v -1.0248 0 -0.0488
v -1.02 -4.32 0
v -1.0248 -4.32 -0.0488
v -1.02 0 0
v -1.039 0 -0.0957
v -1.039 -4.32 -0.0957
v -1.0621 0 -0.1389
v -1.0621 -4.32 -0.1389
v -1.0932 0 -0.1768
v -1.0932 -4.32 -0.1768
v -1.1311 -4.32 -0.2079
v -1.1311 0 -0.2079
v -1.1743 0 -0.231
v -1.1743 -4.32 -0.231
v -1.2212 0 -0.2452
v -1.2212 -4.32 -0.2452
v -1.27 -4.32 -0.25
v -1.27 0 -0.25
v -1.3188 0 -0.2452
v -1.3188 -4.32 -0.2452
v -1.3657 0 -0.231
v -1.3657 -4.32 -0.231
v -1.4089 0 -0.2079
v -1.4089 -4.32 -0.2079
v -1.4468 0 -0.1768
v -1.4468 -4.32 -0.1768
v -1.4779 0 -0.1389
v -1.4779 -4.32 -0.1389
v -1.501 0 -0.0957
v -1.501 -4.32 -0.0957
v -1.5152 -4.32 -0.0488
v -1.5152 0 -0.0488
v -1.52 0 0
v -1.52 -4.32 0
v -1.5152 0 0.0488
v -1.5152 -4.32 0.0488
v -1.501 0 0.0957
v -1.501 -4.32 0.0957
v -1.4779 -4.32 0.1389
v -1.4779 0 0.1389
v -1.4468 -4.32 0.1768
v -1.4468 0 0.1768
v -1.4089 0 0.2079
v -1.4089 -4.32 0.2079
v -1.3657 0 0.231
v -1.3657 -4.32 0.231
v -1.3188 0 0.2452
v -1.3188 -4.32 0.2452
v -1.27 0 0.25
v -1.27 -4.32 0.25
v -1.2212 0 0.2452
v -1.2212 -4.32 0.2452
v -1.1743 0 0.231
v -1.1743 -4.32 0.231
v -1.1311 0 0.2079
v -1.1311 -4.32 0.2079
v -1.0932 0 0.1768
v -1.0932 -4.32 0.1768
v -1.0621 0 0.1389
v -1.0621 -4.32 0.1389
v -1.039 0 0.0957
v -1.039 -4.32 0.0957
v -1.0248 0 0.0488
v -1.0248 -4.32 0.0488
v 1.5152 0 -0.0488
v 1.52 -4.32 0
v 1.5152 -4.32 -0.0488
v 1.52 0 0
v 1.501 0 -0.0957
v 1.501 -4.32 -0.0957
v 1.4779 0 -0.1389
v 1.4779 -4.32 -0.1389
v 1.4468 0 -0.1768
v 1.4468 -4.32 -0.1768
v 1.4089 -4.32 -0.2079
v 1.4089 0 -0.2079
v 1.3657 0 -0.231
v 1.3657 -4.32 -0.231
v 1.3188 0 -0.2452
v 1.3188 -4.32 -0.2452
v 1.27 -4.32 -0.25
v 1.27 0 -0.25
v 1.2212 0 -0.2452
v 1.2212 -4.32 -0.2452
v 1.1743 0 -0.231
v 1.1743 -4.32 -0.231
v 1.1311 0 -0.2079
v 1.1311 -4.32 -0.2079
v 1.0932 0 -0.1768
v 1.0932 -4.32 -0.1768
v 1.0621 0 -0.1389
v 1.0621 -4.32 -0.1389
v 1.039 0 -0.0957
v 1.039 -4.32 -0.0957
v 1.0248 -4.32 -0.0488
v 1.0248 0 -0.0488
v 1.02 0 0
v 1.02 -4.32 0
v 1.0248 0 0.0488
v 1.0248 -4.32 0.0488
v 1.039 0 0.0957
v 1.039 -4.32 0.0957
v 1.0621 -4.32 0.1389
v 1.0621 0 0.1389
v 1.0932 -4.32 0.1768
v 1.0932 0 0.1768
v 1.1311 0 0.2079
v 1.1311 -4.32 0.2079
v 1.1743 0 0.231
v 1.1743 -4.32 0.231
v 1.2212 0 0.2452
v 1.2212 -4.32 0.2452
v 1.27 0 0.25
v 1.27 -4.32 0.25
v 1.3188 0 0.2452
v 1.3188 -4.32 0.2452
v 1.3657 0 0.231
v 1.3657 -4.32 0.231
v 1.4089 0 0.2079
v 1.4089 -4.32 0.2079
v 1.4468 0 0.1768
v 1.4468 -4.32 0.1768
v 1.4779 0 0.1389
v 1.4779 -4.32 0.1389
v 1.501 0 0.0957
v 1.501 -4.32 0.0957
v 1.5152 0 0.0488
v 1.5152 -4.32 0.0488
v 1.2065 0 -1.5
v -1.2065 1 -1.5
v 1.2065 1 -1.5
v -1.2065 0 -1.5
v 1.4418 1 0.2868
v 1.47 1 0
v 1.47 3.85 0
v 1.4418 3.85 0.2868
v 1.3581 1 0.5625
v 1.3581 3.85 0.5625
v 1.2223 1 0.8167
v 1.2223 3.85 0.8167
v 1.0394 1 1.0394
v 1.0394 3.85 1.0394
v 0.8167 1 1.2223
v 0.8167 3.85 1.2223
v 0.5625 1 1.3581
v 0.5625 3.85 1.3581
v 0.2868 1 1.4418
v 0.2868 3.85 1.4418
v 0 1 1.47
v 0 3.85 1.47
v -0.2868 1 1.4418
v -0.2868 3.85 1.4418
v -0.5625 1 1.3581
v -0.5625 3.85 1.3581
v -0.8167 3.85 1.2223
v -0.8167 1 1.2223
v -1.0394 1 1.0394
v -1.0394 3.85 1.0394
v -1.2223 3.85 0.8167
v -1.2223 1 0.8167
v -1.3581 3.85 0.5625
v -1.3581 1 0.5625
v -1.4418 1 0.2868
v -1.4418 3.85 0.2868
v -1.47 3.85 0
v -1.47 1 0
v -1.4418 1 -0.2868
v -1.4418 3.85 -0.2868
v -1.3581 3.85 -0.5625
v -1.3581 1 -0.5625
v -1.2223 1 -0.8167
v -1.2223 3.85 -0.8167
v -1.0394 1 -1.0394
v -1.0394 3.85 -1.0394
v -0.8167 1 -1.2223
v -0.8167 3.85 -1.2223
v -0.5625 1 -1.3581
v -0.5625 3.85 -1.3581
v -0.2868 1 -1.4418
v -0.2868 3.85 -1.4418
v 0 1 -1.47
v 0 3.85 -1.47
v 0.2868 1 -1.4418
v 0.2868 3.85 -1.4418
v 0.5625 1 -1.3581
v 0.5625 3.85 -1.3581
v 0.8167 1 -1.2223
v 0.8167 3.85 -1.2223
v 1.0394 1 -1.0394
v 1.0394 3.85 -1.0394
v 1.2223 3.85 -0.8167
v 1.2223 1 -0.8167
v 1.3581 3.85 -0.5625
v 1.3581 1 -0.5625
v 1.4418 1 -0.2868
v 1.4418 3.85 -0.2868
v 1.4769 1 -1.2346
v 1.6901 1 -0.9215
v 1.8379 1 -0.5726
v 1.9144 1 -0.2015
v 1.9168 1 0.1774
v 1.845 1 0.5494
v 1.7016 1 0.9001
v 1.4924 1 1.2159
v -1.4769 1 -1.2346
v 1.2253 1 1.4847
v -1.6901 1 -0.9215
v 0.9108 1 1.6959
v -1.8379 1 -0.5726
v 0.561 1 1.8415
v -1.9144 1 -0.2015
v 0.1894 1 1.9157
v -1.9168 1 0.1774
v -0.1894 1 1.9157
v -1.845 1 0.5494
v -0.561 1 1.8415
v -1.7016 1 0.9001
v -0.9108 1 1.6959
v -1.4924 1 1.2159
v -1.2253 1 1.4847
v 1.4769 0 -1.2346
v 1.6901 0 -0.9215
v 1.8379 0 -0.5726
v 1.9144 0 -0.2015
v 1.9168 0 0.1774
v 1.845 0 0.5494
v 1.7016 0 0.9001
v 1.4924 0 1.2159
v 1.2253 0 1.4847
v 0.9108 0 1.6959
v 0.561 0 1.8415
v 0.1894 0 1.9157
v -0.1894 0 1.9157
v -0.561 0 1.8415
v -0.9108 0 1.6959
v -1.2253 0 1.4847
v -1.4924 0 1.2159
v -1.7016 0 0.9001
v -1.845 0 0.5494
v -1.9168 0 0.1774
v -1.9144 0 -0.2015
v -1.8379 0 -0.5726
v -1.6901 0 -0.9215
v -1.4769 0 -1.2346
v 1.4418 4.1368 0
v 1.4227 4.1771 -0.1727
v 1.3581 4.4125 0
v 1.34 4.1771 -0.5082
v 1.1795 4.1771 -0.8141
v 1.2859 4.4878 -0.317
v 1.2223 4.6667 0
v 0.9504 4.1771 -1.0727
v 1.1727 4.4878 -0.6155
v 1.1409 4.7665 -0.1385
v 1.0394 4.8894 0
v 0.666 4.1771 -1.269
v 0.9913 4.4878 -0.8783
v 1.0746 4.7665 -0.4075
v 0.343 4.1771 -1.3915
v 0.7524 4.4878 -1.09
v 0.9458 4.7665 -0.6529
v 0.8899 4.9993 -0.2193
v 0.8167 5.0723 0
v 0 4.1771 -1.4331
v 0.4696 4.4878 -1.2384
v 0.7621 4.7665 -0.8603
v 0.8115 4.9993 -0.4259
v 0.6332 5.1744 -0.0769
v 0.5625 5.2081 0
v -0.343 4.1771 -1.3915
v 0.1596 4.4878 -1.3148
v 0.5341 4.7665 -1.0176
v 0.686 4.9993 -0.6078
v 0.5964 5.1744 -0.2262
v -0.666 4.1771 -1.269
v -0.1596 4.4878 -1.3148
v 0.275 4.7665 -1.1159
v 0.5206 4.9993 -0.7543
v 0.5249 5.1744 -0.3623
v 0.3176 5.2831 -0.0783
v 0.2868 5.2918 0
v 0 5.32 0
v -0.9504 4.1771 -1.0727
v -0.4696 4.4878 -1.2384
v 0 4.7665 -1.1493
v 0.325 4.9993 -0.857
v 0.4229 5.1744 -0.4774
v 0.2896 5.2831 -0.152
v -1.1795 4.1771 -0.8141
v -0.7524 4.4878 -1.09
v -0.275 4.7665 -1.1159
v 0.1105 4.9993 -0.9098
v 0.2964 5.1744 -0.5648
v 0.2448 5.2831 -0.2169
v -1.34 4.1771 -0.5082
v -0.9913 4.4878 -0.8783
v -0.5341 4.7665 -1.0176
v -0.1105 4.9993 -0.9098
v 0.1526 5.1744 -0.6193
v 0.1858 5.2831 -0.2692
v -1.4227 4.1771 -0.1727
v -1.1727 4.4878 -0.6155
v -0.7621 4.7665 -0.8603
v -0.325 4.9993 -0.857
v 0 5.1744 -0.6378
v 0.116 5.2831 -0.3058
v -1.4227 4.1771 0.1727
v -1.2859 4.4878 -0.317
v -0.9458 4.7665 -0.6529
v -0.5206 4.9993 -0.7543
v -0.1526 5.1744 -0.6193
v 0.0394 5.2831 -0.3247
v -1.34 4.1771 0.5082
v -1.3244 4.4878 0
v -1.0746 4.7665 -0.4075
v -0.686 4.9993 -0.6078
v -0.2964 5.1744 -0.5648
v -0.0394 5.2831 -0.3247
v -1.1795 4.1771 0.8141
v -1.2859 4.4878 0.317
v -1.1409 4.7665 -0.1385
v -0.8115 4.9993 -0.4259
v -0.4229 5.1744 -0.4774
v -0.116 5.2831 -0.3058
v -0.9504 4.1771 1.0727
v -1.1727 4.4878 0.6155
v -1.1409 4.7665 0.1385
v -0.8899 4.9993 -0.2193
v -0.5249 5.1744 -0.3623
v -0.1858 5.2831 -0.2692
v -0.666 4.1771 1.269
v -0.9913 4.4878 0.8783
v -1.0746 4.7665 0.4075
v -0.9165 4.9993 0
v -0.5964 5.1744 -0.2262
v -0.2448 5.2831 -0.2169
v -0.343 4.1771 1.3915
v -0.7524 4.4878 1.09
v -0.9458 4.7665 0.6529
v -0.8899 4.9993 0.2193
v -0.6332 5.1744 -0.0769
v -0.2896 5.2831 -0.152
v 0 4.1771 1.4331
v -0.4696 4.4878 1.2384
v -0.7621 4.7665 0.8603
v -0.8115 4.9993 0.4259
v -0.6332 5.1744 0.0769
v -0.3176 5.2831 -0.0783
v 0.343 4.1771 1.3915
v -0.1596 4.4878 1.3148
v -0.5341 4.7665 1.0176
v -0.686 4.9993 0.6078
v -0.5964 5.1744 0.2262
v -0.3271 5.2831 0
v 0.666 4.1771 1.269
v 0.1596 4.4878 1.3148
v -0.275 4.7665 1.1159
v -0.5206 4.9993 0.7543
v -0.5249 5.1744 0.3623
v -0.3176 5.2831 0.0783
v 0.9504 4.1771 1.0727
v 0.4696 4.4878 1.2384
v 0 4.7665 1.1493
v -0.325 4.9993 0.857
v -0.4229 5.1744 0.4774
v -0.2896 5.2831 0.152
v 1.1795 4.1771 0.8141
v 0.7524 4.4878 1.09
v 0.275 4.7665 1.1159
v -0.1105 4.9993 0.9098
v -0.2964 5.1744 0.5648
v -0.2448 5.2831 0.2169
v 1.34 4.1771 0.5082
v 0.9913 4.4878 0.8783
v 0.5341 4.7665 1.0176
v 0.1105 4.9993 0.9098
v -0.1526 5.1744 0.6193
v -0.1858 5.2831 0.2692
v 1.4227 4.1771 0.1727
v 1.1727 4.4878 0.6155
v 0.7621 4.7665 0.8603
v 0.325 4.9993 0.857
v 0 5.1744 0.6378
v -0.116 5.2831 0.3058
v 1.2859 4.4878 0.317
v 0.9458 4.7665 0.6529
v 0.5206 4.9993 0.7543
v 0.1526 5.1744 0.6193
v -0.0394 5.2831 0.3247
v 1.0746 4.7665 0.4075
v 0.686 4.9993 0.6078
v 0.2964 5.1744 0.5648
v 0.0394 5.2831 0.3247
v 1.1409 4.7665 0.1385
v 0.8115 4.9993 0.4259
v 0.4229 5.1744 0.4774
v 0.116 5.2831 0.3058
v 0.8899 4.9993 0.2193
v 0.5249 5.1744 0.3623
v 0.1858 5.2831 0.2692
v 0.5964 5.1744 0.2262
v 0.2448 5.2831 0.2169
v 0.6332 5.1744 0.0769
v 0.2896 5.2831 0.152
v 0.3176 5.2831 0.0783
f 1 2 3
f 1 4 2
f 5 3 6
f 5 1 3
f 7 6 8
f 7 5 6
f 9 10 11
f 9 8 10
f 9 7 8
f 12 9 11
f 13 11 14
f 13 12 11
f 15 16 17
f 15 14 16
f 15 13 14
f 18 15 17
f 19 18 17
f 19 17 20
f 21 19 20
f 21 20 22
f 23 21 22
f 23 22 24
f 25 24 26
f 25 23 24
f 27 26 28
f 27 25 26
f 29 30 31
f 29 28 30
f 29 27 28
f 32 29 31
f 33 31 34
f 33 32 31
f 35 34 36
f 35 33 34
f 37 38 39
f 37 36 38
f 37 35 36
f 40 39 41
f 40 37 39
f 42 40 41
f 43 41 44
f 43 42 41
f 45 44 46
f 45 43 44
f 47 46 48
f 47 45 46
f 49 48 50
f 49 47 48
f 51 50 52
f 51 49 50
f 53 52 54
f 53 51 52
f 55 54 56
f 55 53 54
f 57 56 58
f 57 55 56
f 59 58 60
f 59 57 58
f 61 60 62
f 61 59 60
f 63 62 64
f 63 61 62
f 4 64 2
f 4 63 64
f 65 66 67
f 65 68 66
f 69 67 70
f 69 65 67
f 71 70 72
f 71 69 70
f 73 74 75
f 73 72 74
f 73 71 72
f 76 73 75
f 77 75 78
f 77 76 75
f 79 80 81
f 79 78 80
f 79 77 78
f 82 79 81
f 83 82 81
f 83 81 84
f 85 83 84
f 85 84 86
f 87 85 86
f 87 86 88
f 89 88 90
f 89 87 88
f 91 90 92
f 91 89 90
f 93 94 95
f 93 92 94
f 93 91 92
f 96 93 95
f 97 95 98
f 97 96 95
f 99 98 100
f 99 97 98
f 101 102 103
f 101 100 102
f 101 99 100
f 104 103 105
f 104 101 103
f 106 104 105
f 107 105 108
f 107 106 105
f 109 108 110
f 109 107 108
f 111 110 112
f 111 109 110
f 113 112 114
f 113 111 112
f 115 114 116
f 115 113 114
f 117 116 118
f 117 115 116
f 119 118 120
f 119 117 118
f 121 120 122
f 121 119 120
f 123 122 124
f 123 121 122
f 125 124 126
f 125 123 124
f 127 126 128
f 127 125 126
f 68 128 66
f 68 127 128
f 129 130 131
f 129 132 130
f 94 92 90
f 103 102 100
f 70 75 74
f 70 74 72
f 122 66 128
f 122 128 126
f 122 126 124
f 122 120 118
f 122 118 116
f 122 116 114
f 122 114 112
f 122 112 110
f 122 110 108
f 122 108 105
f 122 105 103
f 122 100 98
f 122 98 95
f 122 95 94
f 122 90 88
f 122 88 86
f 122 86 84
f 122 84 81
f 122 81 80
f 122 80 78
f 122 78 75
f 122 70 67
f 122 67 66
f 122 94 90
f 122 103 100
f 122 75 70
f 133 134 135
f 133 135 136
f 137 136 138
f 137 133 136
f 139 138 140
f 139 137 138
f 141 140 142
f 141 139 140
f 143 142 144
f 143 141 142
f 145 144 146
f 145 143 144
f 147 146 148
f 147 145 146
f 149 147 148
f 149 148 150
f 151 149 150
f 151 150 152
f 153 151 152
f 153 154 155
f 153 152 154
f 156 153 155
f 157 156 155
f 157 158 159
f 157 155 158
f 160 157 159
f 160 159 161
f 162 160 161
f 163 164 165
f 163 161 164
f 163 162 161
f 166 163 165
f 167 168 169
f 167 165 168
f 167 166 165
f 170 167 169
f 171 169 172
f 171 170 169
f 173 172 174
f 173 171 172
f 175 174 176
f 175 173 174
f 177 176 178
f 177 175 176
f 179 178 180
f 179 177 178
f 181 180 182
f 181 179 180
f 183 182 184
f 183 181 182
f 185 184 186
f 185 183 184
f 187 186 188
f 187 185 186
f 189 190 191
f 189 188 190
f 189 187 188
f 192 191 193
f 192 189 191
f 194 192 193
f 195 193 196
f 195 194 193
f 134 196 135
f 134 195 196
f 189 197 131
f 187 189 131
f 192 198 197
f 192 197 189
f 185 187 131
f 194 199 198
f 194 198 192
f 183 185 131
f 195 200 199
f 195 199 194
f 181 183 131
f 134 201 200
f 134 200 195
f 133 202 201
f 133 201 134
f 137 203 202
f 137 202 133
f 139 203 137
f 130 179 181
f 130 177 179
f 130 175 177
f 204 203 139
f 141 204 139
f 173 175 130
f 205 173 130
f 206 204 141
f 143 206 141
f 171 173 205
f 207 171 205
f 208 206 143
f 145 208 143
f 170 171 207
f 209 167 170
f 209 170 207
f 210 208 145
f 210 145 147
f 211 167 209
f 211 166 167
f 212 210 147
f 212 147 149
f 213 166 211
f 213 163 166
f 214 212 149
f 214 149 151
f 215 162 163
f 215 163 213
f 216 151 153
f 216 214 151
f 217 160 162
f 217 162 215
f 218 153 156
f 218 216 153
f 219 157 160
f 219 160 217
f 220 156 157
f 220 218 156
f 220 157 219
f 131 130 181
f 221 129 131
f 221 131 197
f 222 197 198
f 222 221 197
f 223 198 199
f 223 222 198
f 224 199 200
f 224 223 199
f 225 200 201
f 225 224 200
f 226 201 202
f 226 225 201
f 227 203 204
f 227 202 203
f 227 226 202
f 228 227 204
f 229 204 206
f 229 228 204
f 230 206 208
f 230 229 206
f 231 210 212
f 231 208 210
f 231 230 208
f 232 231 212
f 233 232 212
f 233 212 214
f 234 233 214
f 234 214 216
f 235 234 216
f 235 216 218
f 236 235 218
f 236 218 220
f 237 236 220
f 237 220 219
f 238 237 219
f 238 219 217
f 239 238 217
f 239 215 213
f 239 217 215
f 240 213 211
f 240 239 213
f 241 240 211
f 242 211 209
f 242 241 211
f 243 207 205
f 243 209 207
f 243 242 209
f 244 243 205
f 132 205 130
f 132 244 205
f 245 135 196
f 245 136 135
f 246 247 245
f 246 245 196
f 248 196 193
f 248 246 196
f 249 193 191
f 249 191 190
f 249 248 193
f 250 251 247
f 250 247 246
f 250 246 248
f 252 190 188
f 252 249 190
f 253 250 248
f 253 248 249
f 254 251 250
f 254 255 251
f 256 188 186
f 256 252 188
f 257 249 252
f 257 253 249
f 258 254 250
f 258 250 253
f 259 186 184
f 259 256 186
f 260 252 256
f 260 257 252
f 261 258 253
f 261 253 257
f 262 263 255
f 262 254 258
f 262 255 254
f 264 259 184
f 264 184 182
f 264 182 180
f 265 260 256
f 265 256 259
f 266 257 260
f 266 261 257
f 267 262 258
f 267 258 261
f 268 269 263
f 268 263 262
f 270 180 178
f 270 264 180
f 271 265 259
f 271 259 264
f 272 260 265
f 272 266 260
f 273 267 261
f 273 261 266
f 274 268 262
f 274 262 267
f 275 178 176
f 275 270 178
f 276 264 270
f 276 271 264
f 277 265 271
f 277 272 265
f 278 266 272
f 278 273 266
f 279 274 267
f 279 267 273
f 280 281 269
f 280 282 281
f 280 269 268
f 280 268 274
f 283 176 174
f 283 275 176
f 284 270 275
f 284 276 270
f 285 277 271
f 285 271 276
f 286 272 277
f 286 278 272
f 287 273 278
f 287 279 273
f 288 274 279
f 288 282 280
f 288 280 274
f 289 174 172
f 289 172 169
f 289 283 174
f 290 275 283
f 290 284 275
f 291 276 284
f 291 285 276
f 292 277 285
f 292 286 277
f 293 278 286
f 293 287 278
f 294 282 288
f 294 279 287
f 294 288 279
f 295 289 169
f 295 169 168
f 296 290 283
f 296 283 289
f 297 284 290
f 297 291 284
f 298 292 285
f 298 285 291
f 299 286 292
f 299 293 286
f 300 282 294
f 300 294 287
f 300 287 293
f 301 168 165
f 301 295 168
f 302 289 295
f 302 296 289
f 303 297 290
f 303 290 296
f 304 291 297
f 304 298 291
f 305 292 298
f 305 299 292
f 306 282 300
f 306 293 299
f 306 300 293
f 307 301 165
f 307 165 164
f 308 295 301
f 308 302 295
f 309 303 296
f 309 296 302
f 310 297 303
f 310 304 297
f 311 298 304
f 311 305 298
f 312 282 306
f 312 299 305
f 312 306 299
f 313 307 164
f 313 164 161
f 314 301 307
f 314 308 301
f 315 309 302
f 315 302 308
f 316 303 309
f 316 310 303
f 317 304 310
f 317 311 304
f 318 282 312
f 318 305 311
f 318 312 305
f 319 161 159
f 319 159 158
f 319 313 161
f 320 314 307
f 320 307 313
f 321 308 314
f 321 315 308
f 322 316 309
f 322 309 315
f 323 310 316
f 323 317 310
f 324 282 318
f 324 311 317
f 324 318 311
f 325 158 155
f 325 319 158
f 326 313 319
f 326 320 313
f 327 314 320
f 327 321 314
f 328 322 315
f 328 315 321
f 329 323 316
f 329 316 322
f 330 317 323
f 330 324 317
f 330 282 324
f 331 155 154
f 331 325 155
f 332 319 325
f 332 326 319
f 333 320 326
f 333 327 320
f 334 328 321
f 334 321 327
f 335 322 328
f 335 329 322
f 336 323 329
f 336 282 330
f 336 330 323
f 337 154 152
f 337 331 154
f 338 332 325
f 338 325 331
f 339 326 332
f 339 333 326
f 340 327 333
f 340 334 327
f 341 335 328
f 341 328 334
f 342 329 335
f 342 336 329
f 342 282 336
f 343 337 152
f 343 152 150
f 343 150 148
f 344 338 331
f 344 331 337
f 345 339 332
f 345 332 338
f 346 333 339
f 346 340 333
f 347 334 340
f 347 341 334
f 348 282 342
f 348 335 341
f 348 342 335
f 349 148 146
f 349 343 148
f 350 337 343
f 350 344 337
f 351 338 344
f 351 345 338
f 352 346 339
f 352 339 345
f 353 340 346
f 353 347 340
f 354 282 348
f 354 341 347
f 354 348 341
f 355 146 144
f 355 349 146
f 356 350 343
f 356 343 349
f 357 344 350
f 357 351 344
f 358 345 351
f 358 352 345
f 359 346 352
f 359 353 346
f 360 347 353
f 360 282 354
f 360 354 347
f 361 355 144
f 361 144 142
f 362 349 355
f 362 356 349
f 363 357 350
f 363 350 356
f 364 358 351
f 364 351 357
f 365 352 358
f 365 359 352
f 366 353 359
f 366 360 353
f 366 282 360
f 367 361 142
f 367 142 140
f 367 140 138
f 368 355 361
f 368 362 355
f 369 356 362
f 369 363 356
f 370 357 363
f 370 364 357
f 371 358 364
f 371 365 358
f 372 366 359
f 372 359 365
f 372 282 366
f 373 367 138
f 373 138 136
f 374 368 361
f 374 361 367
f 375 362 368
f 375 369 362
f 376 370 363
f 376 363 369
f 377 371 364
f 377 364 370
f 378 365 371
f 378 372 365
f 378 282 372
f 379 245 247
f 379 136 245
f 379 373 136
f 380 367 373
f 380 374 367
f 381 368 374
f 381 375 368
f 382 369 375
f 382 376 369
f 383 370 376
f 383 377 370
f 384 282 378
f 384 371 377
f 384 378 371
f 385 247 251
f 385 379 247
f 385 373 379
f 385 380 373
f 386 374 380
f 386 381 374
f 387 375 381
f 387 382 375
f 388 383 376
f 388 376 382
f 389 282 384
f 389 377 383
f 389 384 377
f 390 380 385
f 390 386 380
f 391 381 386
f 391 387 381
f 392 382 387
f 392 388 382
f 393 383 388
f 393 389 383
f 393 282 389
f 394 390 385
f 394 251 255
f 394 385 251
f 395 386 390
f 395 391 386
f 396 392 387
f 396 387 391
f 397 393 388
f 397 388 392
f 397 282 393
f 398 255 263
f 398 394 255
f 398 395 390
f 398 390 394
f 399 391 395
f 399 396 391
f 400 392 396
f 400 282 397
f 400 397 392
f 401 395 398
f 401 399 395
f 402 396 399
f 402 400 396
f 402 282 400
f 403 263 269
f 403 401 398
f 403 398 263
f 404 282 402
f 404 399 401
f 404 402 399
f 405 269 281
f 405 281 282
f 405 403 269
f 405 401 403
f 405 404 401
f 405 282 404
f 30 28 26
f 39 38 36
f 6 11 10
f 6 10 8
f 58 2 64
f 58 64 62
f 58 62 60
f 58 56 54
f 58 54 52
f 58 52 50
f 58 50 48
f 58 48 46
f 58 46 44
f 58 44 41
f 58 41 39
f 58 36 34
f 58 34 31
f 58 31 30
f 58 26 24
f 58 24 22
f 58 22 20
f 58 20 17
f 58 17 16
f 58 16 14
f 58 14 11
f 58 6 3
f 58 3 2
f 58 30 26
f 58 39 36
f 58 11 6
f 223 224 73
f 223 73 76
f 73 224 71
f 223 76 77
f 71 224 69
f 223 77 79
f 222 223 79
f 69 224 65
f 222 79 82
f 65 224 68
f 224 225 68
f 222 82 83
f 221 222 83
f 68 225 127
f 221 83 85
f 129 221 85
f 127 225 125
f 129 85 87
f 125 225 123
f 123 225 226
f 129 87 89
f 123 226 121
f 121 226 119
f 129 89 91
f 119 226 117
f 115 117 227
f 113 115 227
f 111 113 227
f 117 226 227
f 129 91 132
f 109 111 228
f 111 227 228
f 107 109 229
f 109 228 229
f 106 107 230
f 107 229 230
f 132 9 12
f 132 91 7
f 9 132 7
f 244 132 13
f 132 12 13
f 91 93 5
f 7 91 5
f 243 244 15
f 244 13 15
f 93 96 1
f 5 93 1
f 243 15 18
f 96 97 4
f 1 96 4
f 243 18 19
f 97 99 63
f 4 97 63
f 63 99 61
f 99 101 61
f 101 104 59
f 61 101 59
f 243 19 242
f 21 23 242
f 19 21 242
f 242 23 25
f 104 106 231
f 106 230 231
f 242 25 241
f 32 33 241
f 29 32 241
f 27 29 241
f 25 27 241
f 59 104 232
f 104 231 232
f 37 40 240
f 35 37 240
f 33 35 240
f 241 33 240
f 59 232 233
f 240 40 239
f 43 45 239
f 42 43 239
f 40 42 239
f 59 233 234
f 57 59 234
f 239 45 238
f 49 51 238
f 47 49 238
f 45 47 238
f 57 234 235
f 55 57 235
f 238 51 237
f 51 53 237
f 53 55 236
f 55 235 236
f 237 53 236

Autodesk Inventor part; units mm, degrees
ref_plane "YZ Plane" through (0, 0, 0) normal (1, 0, 0) x (0, 1, 0)
ref_plane "XZ Plane" through (0, 0, 0) normal (0, 1, 0) x (-1, 0, 0)
ref_plane "XY Plane" through (0, 0, 0) normal (0, 0, 1) x (1, 0, 0)
sketch "Sketch1" plane through (0, 0, 0) normal (0, 1, 0) x (-1, 0, 0)
  arc A0 (1.2065, -1.5) -> (-1.2065, -1.5) centre (0, 0) ccw
  circle A1 centre (0, 0) radius 1.5
  line L0 (0, -1.5) -> (1.2065, -1.5)
  line L1 (0, -1.5) -> (-1.2065, -1.5)
  dimension "d1" = 3
  dimension "d0" = 3.85
extrude "Extrusion1" add sketch "Sketch1" along normal blind 1 contours A1 | L0 L1 A0
sketch "Sketch2" plane through (0, 1, 0) normal (0, 1, 0) x (1, 0, 0)
  arc A0 (-1.2065, 1.5) -> (1.2065, 1.5) centre (0, 0) ccw projected
  circle A1 centre (0, 0) radius 1.47
  dimension "d4" = 2.94
extrude "Extrusion2" add sketch "Sketch2" along normal blind 4.32
fillet "Fillet1" radius 1.47 1 edges at (-1.47, 5.32, 0)
sketch "Sketch3" plane through (0, 0, 0) normal (0, -1, 0) x (1, 0, 0)
  circle A0 centre (1.27, 0) radius 0.25
  circle A1 centre (-1.27, 0) radius 0.25
  point P0 (0, 0)
  dimension "d8" = 0.5
  dimension "d9" = 0.5
  dimension "d10" = 1.27
  dimension "d11" = 1.27
extrude "Extrusion3" add sketch "Sketch3" along normal blind 4.32
properties part number "3mm_LED"
